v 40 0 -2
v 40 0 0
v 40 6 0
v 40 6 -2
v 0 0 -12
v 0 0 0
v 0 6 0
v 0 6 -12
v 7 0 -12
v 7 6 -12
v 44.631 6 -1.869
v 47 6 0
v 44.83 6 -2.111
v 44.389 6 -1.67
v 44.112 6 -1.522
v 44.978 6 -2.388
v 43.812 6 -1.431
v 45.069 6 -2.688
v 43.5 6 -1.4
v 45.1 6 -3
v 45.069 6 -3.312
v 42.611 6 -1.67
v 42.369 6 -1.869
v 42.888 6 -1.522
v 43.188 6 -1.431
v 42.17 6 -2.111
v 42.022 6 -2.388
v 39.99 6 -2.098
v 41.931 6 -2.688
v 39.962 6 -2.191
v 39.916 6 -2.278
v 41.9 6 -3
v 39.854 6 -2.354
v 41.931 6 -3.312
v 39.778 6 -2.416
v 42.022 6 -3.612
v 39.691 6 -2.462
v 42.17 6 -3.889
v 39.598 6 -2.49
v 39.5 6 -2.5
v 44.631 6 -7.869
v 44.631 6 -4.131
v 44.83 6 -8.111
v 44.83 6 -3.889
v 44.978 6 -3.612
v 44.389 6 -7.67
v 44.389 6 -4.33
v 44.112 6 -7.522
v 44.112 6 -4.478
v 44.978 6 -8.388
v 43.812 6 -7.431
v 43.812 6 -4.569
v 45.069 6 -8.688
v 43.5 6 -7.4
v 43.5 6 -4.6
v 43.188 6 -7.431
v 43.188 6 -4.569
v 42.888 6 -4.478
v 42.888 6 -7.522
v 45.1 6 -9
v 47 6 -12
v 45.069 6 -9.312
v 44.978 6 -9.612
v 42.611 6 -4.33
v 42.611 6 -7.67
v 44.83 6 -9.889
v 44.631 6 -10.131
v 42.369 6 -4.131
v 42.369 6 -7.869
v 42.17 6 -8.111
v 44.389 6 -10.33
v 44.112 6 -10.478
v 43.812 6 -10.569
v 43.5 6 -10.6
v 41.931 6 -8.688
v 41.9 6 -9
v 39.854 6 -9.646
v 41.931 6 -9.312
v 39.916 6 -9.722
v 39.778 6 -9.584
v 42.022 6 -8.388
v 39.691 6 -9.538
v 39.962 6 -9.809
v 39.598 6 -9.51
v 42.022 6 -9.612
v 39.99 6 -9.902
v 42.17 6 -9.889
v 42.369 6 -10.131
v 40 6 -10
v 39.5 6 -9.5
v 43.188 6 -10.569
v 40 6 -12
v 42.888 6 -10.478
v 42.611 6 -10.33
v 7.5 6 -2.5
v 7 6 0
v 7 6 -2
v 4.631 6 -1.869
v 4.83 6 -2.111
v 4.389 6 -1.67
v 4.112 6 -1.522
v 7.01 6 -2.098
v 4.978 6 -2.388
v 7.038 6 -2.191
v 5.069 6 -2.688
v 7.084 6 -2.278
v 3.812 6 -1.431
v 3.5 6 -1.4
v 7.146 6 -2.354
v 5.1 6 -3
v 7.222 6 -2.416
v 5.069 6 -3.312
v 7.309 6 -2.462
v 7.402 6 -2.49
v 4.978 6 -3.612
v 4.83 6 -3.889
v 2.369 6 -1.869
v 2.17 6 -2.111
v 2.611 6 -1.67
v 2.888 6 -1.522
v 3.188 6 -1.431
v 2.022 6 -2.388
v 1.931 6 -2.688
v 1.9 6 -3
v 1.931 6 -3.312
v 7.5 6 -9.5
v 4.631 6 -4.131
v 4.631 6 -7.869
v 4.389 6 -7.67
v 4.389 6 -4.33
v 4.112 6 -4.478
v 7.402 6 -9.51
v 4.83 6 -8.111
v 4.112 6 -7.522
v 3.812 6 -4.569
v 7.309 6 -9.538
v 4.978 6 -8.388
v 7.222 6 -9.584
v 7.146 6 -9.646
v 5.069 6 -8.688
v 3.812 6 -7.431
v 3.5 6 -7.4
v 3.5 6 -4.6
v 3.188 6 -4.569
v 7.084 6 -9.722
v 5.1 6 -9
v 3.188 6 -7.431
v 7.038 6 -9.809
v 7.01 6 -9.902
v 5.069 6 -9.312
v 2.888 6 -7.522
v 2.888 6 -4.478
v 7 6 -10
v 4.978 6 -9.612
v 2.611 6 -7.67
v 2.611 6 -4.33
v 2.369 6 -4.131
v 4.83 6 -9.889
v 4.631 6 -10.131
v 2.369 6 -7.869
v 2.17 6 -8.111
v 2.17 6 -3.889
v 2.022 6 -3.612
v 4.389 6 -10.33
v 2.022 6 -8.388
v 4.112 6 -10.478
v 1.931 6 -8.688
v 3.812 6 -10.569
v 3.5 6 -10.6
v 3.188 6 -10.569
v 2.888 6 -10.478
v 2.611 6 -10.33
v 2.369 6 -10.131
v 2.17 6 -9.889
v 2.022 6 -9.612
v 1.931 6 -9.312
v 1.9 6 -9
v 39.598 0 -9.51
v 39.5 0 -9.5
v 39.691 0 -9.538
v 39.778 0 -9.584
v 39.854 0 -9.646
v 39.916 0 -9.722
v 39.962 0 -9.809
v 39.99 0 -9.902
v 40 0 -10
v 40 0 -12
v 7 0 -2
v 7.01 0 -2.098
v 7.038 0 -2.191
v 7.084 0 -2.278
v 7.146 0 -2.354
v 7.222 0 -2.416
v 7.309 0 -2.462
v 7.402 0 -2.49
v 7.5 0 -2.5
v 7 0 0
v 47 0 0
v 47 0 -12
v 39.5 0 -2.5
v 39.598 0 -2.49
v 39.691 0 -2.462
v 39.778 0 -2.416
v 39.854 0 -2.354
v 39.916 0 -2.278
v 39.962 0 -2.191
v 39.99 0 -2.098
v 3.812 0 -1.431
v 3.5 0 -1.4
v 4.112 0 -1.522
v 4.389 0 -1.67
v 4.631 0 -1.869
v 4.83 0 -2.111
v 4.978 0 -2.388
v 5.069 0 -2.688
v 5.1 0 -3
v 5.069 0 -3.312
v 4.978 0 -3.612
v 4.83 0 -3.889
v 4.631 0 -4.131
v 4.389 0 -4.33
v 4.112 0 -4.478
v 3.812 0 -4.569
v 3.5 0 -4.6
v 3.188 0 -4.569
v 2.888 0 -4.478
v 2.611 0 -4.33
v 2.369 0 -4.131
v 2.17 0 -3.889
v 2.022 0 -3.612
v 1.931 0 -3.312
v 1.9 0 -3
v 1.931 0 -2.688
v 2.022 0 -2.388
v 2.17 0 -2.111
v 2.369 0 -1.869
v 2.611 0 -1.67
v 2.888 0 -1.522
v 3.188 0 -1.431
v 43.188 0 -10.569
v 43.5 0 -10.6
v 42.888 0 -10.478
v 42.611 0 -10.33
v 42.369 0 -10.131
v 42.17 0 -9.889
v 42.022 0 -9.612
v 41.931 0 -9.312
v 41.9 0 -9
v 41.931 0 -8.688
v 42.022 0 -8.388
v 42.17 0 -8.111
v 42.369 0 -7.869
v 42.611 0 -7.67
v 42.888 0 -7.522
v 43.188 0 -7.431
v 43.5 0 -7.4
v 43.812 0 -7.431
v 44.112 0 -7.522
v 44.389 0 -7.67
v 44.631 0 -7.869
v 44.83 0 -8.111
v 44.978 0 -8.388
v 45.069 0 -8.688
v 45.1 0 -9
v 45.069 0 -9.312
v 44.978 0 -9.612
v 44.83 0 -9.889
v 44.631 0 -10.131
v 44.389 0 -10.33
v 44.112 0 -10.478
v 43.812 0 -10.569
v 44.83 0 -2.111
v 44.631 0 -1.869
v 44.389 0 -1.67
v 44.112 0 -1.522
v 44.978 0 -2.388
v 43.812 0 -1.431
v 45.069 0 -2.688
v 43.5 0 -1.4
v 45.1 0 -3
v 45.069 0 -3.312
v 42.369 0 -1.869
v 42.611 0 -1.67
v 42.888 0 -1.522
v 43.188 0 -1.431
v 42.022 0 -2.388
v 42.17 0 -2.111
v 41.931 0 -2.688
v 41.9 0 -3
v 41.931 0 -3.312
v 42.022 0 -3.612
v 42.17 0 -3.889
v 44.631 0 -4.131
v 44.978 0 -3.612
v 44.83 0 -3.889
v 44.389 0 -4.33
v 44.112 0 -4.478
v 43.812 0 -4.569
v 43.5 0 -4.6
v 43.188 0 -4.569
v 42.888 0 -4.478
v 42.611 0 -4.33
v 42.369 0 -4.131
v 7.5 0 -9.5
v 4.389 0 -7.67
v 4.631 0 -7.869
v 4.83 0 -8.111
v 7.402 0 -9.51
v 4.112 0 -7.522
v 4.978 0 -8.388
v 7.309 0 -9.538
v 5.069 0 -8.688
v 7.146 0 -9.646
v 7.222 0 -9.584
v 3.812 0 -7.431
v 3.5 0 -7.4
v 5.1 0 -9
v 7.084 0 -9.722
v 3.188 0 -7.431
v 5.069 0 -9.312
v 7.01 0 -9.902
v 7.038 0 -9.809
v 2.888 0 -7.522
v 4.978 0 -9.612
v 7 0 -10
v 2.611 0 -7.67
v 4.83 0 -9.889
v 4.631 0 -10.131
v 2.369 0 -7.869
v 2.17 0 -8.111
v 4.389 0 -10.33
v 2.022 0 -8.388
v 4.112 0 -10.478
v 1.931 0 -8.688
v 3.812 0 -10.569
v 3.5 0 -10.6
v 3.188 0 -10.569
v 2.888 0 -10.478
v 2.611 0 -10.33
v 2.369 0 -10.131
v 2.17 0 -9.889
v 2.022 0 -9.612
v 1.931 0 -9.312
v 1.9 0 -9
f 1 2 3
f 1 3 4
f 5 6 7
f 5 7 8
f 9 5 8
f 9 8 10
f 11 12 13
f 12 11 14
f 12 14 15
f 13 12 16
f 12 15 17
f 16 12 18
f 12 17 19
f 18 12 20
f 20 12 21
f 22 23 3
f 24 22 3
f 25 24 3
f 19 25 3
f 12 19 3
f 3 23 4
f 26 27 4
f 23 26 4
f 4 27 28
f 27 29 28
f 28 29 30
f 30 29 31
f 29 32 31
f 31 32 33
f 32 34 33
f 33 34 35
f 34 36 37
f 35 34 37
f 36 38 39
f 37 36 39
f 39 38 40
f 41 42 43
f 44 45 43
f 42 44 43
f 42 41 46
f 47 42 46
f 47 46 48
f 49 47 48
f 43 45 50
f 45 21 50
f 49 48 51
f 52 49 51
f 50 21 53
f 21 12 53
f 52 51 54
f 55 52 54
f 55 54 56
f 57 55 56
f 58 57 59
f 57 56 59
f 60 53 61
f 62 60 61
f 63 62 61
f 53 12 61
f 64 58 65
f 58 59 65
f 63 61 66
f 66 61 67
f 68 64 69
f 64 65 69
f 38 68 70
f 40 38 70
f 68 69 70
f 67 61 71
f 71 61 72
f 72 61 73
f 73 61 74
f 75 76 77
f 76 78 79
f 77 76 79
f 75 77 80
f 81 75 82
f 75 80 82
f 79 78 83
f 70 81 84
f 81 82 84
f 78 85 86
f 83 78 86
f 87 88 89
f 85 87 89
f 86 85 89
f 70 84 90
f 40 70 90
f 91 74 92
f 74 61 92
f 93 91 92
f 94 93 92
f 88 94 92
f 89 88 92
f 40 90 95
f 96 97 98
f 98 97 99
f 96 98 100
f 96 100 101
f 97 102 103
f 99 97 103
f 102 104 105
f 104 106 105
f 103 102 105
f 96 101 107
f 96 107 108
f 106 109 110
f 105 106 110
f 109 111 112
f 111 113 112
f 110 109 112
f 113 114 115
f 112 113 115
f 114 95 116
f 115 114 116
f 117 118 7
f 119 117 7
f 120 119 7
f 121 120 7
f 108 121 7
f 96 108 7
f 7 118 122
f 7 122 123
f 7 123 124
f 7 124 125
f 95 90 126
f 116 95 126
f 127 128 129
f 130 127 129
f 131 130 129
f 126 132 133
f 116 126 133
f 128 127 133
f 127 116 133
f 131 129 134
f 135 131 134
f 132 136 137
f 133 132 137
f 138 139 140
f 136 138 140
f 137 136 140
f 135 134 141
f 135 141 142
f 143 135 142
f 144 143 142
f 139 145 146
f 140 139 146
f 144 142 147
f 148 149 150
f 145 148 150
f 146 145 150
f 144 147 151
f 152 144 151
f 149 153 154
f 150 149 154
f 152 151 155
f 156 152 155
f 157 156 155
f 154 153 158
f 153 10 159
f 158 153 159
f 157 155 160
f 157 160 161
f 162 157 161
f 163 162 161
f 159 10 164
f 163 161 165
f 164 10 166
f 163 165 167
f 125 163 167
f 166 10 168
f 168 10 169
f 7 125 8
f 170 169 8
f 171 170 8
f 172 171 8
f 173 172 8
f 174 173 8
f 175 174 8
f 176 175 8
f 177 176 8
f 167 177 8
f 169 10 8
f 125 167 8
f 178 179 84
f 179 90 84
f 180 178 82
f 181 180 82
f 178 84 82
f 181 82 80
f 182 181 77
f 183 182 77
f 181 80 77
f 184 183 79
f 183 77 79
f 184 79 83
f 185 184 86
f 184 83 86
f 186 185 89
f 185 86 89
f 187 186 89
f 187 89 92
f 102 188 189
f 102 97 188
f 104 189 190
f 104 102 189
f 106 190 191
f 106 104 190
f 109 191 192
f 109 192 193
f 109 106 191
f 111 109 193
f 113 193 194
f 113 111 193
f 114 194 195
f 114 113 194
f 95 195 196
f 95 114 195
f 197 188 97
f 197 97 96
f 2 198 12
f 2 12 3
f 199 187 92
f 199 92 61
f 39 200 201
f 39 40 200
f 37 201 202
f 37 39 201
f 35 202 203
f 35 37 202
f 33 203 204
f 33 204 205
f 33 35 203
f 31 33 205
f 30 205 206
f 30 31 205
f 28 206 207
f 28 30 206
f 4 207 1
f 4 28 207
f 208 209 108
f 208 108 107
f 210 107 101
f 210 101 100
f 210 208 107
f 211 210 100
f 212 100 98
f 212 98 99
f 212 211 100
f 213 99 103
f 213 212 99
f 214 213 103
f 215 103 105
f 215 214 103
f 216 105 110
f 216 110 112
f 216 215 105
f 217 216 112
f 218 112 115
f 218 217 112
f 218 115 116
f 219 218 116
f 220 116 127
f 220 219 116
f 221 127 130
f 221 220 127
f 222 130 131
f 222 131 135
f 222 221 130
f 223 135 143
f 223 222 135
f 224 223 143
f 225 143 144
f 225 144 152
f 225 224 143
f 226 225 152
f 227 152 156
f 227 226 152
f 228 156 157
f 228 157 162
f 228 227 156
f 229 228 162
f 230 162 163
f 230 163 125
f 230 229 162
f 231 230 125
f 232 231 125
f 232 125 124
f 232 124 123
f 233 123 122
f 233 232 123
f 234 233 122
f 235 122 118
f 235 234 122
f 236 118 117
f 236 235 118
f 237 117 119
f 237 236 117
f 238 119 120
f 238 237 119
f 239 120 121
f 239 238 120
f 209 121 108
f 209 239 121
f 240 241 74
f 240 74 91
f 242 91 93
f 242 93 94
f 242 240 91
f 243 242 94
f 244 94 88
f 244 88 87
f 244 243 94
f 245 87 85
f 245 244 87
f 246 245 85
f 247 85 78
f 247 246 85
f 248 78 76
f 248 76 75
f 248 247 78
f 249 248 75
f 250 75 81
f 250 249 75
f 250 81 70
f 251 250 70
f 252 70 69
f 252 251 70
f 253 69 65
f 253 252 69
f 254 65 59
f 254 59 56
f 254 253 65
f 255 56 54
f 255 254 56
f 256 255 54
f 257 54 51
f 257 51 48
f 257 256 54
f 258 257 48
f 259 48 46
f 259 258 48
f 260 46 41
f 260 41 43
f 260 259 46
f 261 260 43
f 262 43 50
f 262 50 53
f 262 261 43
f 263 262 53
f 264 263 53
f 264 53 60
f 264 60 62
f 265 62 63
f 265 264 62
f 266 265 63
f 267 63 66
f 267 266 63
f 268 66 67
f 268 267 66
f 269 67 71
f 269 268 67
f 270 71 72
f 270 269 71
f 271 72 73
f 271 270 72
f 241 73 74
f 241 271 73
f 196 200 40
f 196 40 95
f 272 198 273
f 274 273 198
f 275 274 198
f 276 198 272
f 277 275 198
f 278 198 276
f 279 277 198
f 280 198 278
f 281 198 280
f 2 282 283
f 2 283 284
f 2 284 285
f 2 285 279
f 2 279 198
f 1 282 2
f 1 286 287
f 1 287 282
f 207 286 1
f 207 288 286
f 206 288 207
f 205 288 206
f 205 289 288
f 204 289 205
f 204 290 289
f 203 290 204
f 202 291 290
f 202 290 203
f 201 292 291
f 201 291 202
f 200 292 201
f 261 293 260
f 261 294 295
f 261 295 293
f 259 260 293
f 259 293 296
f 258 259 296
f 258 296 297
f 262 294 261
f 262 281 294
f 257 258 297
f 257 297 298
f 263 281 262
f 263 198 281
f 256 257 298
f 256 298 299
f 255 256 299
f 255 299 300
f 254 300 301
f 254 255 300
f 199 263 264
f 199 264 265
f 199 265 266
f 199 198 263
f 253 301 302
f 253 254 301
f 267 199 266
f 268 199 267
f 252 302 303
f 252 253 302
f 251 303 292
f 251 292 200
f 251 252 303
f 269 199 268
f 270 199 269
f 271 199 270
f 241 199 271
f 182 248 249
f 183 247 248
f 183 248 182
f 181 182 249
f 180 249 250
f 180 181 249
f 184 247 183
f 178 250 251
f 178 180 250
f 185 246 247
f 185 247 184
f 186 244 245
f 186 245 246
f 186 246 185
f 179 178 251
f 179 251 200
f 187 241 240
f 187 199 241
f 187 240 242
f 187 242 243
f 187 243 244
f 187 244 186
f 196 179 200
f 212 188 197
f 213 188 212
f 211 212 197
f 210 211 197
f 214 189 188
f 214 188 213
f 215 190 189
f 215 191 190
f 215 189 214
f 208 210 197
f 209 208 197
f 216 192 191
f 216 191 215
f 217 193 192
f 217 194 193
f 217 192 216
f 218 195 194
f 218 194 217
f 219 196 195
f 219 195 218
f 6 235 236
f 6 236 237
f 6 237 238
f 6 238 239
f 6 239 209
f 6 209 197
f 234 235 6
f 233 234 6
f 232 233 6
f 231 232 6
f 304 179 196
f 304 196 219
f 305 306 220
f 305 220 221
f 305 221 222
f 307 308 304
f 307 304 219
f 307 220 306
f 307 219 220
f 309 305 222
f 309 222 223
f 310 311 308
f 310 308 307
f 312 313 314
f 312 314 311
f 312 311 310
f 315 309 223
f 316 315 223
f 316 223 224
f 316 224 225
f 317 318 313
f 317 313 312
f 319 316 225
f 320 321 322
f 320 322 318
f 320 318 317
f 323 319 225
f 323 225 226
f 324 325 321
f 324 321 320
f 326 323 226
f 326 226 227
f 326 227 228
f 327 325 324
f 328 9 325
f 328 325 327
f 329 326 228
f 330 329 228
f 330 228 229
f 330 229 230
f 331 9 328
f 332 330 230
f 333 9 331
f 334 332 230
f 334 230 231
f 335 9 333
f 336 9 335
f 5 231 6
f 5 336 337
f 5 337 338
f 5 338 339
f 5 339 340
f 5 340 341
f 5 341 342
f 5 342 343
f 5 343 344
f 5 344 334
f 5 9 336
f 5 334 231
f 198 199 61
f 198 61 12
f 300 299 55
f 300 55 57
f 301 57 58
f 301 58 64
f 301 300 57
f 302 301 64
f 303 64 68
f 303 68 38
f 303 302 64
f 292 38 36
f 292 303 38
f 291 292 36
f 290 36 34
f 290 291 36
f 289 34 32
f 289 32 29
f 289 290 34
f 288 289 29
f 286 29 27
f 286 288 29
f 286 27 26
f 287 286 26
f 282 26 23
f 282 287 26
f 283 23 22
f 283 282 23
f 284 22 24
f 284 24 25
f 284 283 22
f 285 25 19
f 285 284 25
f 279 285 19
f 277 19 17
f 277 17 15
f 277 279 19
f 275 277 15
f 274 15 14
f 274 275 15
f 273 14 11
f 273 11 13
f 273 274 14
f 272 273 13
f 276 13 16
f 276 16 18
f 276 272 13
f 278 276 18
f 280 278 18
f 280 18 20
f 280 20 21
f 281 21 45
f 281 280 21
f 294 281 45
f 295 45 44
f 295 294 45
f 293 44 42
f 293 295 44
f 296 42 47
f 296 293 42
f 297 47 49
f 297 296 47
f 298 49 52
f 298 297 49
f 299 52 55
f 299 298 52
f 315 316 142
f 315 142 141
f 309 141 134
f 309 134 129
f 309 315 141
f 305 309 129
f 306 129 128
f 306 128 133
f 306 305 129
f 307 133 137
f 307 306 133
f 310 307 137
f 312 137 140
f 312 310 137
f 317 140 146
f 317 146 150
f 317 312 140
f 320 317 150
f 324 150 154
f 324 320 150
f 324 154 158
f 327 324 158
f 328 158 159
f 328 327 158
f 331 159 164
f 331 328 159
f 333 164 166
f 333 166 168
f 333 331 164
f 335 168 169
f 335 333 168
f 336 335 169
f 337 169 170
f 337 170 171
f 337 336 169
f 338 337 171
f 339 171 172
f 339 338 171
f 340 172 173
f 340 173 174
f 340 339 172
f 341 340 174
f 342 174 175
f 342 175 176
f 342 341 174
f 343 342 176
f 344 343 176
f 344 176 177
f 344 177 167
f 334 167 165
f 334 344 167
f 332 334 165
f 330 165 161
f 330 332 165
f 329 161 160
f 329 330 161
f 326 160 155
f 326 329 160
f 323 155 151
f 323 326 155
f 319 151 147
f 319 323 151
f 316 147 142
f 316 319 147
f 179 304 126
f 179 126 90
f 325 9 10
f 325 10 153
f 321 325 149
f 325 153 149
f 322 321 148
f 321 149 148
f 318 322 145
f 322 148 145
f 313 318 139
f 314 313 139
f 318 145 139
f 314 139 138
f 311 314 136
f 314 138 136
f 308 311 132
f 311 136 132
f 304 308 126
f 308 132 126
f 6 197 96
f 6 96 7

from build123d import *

# Parameters (mm, degrees)
SKETCH1_R           = 1.6
BOSS_EXTRUDE1_DEPTH = 6
FILLET1_R           = 0.5


with BuildPart() as part:
    # Sketch1 → Boss-Extrude1 (new body)
    with BuildSketch(Plane(origin=(0, 0, 0), x_dir=(1, 0, 0), z_dir=(0, 1, 0))):
        Polygon((0, 0), (0, 12), (7, 12), (7, 9.5), (40, 9.5), (40, 12), (47, 12), (47, 0), (40, 0), (40, 2.5), (7, 2.5), (7, 0), align=None)
        with Locations(Location((3.5, 9, 0), (0, 0, 270))):
            Circle(SKETCH1_R, mode=Mode.SUBTRACT)
        with Locations(Location((3.5, 3, 0), (0, 0, 270))):
            Circle(SKETCH1_R, mode=Mode.SUBTRACT)
        with Locations(Location((43.5, 3, 0), (0, 0, 90))):
            Circle(SKETCH1_R, mode=Mode.SUBTRACT)
        with Locations(Location((43.5, 9, 0), (0, 0, 90))):
            Circle(SKETCH1_R, mode=Mode.SUBTRACT)
    extrude(amount=BOSS_EXTRUDE1_DEPTH)

    # Fillet1
    fillet1_edges = [part.edges().sort_by_distance(p)[0] for p in [
        (7, 3, -9.5),
        (40, 3, -9.5),
        (40, 3, -2.5),
        (7, 3, -2.5),
    ]]
    fillet(fillet1_edges, radius=FILLET1_R)


solid = part.part
